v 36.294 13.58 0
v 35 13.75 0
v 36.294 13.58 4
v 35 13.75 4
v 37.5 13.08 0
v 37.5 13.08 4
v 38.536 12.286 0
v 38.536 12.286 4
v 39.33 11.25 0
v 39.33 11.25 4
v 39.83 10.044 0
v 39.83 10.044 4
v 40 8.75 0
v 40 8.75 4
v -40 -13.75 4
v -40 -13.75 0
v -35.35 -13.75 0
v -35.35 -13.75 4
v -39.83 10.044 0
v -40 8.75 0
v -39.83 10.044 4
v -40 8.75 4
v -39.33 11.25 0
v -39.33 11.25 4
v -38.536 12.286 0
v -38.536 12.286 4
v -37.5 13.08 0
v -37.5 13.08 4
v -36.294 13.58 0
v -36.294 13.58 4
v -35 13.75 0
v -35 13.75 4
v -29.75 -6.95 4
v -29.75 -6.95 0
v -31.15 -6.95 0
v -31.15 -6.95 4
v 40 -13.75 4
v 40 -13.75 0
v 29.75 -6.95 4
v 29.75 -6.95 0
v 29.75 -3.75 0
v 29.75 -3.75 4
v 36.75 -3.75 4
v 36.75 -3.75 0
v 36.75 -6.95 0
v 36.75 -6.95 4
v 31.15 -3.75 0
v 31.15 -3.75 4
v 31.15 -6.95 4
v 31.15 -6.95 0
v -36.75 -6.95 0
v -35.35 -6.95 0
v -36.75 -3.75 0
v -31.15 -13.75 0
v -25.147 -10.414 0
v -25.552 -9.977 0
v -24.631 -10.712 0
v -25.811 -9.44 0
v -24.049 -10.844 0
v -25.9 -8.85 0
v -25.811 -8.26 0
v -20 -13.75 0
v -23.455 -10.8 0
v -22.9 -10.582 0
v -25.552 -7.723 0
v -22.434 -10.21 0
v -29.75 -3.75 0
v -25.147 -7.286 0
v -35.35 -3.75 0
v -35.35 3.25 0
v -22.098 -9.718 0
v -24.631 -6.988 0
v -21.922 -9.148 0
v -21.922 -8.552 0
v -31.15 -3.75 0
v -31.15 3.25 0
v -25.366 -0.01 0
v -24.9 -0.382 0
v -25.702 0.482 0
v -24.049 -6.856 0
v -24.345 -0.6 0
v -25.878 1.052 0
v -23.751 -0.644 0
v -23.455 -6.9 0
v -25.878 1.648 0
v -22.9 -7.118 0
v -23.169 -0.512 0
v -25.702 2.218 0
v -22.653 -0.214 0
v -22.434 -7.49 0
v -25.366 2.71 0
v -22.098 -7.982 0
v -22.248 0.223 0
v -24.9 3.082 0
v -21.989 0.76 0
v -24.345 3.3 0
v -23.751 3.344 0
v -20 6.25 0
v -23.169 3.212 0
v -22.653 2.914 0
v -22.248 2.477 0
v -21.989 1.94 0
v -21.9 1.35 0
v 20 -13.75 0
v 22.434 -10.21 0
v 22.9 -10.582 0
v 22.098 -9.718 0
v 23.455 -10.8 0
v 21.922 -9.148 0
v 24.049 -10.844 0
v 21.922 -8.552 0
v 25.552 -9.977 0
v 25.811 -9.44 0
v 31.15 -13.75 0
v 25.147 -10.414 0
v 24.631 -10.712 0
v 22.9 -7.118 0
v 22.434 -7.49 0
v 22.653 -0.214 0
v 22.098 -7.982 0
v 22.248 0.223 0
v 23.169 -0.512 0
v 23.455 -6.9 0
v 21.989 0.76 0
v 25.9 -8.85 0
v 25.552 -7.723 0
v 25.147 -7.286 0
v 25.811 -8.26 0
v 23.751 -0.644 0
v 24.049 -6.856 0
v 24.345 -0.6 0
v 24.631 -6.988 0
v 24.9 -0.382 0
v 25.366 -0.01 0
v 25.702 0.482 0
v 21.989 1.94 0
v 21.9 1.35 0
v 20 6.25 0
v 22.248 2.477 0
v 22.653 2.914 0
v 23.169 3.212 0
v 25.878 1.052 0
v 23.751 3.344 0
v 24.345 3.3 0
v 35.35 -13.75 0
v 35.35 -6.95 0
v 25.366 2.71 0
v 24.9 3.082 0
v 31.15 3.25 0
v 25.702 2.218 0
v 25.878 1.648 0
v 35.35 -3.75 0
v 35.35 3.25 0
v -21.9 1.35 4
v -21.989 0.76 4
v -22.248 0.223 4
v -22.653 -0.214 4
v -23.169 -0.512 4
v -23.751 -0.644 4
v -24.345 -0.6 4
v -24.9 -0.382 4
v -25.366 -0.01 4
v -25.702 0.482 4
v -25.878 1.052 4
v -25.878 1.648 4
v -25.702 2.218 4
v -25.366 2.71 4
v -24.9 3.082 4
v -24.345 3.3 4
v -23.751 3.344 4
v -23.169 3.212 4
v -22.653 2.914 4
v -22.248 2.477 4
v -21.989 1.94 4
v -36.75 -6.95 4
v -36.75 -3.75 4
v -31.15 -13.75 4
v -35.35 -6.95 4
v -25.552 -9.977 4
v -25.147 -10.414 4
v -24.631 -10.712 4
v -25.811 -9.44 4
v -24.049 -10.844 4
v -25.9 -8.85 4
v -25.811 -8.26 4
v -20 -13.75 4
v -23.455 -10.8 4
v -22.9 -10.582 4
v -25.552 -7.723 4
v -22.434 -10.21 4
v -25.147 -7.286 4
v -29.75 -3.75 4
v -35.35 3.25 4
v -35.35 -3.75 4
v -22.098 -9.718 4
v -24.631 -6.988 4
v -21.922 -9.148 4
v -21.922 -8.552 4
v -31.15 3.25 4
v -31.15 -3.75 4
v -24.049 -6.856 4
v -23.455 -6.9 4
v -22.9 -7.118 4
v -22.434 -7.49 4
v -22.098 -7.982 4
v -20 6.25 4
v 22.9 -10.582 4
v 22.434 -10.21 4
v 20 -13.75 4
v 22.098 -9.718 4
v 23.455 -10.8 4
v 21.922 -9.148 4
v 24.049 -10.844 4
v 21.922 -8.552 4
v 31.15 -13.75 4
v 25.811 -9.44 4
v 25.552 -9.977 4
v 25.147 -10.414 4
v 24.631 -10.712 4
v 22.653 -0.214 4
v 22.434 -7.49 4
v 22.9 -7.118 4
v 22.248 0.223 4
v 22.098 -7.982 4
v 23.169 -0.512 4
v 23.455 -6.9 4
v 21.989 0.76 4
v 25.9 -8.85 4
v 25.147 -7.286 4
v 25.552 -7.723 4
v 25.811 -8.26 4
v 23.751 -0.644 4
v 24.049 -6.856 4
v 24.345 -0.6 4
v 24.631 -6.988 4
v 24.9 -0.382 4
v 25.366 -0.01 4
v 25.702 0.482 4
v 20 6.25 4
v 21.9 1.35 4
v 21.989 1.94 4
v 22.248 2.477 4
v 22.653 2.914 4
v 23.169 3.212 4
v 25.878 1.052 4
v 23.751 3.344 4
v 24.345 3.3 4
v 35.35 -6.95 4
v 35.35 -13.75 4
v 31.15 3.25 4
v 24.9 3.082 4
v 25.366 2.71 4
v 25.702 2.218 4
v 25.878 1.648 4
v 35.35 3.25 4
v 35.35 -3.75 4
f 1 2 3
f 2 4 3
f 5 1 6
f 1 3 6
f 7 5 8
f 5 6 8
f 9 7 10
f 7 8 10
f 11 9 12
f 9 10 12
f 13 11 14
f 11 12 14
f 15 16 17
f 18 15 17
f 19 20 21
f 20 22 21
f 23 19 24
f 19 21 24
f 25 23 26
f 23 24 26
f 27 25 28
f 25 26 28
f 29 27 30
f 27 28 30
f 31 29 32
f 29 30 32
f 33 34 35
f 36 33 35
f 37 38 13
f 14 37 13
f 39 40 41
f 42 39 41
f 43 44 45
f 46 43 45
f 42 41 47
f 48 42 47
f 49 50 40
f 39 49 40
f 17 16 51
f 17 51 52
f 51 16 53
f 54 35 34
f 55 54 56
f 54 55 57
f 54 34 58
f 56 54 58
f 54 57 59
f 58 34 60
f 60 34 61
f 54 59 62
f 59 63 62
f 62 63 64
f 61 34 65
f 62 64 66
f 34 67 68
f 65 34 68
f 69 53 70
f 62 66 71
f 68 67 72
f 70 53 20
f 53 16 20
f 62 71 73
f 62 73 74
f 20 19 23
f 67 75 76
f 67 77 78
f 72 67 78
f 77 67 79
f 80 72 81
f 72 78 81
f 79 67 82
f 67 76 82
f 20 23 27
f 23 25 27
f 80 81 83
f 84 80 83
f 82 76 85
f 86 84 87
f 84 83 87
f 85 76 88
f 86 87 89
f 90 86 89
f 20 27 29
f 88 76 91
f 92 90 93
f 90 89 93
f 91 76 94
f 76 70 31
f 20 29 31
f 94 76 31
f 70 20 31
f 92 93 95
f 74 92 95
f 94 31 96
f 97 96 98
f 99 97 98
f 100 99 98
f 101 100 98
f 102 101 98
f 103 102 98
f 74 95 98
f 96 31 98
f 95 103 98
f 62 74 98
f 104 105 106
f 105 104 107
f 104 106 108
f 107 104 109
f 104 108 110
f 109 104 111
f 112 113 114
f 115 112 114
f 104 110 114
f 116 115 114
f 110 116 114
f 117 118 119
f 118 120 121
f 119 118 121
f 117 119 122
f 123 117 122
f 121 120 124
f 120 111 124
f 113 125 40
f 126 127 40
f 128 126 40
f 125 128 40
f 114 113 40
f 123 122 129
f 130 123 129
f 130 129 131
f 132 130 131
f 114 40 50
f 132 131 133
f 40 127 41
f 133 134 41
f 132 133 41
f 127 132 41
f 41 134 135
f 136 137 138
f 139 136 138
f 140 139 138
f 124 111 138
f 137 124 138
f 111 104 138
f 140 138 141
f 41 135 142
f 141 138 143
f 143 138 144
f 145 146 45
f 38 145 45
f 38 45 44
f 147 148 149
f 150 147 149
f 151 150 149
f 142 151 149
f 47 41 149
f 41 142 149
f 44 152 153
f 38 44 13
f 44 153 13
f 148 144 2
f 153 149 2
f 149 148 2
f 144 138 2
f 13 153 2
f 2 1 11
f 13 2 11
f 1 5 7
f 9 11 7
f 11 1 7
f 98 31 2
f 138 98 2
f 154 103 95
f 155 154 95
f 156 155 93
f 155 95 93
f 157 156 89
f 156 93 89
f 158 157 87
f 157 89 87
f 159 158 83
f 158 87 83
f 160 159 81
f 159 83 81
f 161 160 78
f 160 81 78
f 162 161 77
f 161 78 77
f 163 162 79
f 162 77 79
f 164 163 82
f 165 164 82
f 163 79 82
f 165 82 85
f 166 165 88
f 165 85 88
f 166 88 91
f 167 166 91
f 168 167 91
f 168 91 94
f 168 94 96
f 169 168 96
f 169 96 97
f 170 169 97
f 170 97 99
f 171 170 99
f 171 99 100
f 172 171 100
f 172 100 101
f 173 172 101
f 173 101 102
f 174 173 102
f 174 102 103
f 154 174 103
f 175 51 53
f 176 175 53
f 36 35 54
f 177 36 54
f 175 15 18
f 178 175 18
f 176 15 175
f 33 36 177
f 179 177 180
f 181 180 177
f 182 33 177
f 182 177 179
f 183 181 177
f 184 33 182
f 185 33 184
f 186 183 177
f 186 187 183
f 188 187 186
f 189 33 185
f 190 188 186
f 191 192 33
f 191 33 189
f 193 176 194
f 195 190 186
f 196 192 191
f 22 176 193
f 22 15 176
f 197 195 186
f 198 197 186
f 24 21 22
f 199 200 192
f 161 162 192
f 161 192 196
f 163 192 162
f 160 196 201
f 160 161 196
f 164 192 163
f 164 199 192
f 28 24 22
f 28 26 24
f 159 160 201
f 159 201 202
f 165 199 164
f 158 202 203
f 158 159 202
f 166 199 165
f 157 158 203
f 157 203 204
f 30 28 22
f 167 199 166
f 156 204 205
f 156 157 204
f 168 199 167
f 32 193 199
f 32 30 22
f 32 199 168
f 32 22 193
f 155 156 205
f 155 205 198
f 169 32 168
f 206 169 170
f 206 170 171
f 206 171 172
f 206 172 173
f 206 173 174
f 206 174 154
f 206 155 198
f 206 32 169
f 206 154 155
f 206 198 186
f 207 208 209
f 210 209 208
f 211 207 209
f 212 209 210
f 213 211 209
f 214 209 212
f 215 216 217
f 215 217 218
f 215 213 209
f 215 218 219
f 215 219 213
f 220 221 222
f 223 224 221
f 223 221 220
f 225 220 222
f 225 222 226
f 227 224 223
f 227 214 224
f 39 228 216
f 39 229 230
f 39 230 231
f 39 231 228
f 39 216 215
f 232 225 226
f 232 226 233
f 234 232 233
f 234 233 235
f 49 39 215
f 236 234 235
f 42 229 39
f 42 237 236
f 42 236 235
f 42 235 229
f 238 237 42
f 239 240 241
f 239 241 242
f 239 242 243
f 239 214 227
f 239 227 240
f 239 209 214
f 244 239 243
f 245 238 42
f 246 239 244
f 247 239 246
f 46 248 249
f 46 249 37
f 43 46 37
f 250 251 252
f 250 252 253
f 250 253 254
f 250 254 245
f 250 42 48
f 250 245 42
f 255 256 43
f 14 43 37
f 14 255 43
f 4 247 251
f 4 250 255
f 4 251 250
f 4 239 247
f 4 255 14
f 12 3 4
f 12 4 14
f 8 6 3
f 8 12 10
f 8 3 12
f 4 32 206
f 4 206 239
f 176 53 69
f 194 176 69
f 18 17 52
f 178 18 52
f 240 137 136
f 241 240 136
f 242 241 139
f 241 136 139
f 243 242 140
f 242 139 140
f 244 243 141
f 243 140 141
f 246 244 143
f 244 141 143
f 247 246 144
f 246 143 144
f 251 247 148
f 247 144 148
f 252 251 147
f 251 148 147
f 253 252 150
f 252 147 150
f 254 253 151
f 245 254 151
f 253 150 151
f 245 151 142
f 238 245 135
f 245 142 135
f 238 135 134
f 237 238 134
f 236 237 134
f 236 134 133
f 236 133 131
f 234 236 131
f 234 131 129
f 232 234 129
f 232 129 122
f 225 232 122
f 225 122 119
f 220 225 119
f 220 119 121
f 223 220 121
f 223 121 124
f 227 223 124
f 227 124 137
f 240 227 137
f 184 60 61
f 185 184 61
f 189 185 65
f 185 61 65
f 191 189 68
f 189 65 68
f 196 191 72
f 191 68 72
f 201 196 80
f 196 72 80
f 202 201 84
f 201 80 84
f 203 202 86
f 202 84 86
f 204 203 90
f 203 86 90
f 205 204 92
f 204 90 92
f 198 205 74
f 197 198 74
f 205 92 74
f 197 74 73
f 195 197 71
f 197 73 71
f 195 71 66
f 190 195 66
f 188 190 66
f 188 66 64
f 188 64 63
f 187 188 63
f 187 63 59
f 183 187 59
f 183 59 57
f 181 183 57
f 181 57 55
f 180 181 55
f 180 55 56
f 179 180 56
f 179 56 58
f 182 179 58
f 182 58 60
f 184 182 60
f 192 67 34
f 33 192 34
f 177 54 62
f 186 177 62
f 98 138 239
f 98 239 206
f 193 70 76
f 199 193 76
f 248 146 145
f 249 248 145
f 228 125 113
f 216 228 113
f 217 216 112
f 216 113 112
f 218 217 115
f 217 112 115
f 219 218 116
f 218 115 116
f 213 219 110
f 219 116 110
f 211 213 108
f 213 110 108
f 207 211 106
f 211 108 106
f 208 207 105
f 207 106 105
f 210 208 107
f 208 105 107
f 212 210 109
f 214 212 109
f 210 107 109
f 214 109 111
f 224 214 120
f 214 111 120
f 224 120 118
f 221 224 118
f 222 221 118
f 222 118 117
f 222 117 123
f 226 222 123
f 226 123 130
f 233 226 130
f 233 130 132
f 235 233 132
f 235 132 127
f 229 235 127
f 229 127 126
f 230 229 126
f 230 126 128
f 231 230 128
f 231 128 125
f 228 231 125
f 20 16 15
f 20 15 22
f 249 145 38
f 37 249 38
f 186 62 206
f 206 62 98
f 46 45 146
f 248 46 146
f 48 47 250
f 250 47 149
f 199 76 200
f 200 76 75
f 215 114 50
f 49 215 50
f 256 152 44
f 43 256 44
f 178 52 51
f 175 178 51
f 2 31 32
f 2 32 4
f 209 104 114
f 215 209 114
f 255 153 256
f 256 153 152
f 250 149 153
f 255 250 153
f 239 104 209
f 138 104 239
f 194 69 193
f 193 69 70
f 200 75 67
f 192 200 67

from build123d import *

# Parameters (mm, degrees)
ESQUISSE1_W             = 80
ESQUISSE1_H             = 27.5
BOSS_EXTRU_1_DEPTH      = 4
ESQUISSE2_R             = 2
ESQUISSE2_W             = 40
ESQUISSE2_H             = 20
ENL_V_MAT_EXTRU_1_DEPTH = 43.486027115
ENL_V_MAT_EXTRU_2_DEPTH = 43.486027115
CONG_1_R                = 5


with BuildPart() as part:
    # Esquisse1 → Boss.-Extru.1 (new body)
    with BuildSketch(Plane.XY):
        Rectangle(ESQUISSE1_W, ESQUISSE1_H)
    extrude(amount=BOSS_EXTRU_1_DEPTH)

    # Esquisse2 → Enlèv. mat.-Extru.1 (cut, through all)
    with BuildSketch(Plane(origin=(0, 0, 0), x_dir=(-1, 0, 0), z_dir=(0, 0, -1))):
        with Locations((-23.9, 1.35)):
            Circle(ESQUISSE2_R)
        with Locations(Location((-23.9, -8.85, 0), (0, 0, 180))):
            Circle(ESQUISSE2_R)
        with Locations((23.9, -8.85)):
            Circle(ESQUISSE2_R)
        with Locations(Location((23.9, 1.35, 0), (0, 0, 180))):
            Circle(ESQUISSE2_R)
        with Locations((0, -3.75)):
            Rectangle(ESQUISSE2_W, ESQUISSE2_H)
    extrude(amount=-ENL_V_MAT_EXTRU_1_DEPTH, mode=Mode.SUBTRACT)

    # Esquisse3 → Enlèv. mat.-Extru.2 (cut, through all)
    with BuildSketch(Plane(origin=(0, 0, 0), x_dir=(-1, 0, 0), z_dir=(0, 0, -1))):
        Polygon((31.15, -13.75), (35.35, -13.75), (35.35, -6.95), (36.75, -6.95), (36.75, -3.75), (35.35, -3.75), (35.35, 3.25), (31.15, 3.25), (31.15, -3.75), (29.75, -3.75), (29.75, -6.95), (31.15, -6.95), align=None)
        Polygon((-31.15, -13.75), (-31.15, -6.95), (-29.75, -6.95), (-29.75, -3.75), (-31.15, -3.75), (-31.15, 3.25), (-35.35, 3.25), (-35.35, -3.75), (-36.75, -3.75), (-36.75, -6.95), (-35.35, -6.95), (-35.35, -13.75), align=None)
    extrude(amount=-ENL_V_MAT_EXTRU_2_DEPTH, mode=Mode.SUBTRACT)

    # Congé1
    cong_1_edges = [part.edges().sort_by_distance(p)[0] for p in [
        (-40, 13.75, 2),
        (40, 13.75, 2),
    ]]
    fillet(cong_1_edges, radius=CONG_1_R)


solid = part.part
